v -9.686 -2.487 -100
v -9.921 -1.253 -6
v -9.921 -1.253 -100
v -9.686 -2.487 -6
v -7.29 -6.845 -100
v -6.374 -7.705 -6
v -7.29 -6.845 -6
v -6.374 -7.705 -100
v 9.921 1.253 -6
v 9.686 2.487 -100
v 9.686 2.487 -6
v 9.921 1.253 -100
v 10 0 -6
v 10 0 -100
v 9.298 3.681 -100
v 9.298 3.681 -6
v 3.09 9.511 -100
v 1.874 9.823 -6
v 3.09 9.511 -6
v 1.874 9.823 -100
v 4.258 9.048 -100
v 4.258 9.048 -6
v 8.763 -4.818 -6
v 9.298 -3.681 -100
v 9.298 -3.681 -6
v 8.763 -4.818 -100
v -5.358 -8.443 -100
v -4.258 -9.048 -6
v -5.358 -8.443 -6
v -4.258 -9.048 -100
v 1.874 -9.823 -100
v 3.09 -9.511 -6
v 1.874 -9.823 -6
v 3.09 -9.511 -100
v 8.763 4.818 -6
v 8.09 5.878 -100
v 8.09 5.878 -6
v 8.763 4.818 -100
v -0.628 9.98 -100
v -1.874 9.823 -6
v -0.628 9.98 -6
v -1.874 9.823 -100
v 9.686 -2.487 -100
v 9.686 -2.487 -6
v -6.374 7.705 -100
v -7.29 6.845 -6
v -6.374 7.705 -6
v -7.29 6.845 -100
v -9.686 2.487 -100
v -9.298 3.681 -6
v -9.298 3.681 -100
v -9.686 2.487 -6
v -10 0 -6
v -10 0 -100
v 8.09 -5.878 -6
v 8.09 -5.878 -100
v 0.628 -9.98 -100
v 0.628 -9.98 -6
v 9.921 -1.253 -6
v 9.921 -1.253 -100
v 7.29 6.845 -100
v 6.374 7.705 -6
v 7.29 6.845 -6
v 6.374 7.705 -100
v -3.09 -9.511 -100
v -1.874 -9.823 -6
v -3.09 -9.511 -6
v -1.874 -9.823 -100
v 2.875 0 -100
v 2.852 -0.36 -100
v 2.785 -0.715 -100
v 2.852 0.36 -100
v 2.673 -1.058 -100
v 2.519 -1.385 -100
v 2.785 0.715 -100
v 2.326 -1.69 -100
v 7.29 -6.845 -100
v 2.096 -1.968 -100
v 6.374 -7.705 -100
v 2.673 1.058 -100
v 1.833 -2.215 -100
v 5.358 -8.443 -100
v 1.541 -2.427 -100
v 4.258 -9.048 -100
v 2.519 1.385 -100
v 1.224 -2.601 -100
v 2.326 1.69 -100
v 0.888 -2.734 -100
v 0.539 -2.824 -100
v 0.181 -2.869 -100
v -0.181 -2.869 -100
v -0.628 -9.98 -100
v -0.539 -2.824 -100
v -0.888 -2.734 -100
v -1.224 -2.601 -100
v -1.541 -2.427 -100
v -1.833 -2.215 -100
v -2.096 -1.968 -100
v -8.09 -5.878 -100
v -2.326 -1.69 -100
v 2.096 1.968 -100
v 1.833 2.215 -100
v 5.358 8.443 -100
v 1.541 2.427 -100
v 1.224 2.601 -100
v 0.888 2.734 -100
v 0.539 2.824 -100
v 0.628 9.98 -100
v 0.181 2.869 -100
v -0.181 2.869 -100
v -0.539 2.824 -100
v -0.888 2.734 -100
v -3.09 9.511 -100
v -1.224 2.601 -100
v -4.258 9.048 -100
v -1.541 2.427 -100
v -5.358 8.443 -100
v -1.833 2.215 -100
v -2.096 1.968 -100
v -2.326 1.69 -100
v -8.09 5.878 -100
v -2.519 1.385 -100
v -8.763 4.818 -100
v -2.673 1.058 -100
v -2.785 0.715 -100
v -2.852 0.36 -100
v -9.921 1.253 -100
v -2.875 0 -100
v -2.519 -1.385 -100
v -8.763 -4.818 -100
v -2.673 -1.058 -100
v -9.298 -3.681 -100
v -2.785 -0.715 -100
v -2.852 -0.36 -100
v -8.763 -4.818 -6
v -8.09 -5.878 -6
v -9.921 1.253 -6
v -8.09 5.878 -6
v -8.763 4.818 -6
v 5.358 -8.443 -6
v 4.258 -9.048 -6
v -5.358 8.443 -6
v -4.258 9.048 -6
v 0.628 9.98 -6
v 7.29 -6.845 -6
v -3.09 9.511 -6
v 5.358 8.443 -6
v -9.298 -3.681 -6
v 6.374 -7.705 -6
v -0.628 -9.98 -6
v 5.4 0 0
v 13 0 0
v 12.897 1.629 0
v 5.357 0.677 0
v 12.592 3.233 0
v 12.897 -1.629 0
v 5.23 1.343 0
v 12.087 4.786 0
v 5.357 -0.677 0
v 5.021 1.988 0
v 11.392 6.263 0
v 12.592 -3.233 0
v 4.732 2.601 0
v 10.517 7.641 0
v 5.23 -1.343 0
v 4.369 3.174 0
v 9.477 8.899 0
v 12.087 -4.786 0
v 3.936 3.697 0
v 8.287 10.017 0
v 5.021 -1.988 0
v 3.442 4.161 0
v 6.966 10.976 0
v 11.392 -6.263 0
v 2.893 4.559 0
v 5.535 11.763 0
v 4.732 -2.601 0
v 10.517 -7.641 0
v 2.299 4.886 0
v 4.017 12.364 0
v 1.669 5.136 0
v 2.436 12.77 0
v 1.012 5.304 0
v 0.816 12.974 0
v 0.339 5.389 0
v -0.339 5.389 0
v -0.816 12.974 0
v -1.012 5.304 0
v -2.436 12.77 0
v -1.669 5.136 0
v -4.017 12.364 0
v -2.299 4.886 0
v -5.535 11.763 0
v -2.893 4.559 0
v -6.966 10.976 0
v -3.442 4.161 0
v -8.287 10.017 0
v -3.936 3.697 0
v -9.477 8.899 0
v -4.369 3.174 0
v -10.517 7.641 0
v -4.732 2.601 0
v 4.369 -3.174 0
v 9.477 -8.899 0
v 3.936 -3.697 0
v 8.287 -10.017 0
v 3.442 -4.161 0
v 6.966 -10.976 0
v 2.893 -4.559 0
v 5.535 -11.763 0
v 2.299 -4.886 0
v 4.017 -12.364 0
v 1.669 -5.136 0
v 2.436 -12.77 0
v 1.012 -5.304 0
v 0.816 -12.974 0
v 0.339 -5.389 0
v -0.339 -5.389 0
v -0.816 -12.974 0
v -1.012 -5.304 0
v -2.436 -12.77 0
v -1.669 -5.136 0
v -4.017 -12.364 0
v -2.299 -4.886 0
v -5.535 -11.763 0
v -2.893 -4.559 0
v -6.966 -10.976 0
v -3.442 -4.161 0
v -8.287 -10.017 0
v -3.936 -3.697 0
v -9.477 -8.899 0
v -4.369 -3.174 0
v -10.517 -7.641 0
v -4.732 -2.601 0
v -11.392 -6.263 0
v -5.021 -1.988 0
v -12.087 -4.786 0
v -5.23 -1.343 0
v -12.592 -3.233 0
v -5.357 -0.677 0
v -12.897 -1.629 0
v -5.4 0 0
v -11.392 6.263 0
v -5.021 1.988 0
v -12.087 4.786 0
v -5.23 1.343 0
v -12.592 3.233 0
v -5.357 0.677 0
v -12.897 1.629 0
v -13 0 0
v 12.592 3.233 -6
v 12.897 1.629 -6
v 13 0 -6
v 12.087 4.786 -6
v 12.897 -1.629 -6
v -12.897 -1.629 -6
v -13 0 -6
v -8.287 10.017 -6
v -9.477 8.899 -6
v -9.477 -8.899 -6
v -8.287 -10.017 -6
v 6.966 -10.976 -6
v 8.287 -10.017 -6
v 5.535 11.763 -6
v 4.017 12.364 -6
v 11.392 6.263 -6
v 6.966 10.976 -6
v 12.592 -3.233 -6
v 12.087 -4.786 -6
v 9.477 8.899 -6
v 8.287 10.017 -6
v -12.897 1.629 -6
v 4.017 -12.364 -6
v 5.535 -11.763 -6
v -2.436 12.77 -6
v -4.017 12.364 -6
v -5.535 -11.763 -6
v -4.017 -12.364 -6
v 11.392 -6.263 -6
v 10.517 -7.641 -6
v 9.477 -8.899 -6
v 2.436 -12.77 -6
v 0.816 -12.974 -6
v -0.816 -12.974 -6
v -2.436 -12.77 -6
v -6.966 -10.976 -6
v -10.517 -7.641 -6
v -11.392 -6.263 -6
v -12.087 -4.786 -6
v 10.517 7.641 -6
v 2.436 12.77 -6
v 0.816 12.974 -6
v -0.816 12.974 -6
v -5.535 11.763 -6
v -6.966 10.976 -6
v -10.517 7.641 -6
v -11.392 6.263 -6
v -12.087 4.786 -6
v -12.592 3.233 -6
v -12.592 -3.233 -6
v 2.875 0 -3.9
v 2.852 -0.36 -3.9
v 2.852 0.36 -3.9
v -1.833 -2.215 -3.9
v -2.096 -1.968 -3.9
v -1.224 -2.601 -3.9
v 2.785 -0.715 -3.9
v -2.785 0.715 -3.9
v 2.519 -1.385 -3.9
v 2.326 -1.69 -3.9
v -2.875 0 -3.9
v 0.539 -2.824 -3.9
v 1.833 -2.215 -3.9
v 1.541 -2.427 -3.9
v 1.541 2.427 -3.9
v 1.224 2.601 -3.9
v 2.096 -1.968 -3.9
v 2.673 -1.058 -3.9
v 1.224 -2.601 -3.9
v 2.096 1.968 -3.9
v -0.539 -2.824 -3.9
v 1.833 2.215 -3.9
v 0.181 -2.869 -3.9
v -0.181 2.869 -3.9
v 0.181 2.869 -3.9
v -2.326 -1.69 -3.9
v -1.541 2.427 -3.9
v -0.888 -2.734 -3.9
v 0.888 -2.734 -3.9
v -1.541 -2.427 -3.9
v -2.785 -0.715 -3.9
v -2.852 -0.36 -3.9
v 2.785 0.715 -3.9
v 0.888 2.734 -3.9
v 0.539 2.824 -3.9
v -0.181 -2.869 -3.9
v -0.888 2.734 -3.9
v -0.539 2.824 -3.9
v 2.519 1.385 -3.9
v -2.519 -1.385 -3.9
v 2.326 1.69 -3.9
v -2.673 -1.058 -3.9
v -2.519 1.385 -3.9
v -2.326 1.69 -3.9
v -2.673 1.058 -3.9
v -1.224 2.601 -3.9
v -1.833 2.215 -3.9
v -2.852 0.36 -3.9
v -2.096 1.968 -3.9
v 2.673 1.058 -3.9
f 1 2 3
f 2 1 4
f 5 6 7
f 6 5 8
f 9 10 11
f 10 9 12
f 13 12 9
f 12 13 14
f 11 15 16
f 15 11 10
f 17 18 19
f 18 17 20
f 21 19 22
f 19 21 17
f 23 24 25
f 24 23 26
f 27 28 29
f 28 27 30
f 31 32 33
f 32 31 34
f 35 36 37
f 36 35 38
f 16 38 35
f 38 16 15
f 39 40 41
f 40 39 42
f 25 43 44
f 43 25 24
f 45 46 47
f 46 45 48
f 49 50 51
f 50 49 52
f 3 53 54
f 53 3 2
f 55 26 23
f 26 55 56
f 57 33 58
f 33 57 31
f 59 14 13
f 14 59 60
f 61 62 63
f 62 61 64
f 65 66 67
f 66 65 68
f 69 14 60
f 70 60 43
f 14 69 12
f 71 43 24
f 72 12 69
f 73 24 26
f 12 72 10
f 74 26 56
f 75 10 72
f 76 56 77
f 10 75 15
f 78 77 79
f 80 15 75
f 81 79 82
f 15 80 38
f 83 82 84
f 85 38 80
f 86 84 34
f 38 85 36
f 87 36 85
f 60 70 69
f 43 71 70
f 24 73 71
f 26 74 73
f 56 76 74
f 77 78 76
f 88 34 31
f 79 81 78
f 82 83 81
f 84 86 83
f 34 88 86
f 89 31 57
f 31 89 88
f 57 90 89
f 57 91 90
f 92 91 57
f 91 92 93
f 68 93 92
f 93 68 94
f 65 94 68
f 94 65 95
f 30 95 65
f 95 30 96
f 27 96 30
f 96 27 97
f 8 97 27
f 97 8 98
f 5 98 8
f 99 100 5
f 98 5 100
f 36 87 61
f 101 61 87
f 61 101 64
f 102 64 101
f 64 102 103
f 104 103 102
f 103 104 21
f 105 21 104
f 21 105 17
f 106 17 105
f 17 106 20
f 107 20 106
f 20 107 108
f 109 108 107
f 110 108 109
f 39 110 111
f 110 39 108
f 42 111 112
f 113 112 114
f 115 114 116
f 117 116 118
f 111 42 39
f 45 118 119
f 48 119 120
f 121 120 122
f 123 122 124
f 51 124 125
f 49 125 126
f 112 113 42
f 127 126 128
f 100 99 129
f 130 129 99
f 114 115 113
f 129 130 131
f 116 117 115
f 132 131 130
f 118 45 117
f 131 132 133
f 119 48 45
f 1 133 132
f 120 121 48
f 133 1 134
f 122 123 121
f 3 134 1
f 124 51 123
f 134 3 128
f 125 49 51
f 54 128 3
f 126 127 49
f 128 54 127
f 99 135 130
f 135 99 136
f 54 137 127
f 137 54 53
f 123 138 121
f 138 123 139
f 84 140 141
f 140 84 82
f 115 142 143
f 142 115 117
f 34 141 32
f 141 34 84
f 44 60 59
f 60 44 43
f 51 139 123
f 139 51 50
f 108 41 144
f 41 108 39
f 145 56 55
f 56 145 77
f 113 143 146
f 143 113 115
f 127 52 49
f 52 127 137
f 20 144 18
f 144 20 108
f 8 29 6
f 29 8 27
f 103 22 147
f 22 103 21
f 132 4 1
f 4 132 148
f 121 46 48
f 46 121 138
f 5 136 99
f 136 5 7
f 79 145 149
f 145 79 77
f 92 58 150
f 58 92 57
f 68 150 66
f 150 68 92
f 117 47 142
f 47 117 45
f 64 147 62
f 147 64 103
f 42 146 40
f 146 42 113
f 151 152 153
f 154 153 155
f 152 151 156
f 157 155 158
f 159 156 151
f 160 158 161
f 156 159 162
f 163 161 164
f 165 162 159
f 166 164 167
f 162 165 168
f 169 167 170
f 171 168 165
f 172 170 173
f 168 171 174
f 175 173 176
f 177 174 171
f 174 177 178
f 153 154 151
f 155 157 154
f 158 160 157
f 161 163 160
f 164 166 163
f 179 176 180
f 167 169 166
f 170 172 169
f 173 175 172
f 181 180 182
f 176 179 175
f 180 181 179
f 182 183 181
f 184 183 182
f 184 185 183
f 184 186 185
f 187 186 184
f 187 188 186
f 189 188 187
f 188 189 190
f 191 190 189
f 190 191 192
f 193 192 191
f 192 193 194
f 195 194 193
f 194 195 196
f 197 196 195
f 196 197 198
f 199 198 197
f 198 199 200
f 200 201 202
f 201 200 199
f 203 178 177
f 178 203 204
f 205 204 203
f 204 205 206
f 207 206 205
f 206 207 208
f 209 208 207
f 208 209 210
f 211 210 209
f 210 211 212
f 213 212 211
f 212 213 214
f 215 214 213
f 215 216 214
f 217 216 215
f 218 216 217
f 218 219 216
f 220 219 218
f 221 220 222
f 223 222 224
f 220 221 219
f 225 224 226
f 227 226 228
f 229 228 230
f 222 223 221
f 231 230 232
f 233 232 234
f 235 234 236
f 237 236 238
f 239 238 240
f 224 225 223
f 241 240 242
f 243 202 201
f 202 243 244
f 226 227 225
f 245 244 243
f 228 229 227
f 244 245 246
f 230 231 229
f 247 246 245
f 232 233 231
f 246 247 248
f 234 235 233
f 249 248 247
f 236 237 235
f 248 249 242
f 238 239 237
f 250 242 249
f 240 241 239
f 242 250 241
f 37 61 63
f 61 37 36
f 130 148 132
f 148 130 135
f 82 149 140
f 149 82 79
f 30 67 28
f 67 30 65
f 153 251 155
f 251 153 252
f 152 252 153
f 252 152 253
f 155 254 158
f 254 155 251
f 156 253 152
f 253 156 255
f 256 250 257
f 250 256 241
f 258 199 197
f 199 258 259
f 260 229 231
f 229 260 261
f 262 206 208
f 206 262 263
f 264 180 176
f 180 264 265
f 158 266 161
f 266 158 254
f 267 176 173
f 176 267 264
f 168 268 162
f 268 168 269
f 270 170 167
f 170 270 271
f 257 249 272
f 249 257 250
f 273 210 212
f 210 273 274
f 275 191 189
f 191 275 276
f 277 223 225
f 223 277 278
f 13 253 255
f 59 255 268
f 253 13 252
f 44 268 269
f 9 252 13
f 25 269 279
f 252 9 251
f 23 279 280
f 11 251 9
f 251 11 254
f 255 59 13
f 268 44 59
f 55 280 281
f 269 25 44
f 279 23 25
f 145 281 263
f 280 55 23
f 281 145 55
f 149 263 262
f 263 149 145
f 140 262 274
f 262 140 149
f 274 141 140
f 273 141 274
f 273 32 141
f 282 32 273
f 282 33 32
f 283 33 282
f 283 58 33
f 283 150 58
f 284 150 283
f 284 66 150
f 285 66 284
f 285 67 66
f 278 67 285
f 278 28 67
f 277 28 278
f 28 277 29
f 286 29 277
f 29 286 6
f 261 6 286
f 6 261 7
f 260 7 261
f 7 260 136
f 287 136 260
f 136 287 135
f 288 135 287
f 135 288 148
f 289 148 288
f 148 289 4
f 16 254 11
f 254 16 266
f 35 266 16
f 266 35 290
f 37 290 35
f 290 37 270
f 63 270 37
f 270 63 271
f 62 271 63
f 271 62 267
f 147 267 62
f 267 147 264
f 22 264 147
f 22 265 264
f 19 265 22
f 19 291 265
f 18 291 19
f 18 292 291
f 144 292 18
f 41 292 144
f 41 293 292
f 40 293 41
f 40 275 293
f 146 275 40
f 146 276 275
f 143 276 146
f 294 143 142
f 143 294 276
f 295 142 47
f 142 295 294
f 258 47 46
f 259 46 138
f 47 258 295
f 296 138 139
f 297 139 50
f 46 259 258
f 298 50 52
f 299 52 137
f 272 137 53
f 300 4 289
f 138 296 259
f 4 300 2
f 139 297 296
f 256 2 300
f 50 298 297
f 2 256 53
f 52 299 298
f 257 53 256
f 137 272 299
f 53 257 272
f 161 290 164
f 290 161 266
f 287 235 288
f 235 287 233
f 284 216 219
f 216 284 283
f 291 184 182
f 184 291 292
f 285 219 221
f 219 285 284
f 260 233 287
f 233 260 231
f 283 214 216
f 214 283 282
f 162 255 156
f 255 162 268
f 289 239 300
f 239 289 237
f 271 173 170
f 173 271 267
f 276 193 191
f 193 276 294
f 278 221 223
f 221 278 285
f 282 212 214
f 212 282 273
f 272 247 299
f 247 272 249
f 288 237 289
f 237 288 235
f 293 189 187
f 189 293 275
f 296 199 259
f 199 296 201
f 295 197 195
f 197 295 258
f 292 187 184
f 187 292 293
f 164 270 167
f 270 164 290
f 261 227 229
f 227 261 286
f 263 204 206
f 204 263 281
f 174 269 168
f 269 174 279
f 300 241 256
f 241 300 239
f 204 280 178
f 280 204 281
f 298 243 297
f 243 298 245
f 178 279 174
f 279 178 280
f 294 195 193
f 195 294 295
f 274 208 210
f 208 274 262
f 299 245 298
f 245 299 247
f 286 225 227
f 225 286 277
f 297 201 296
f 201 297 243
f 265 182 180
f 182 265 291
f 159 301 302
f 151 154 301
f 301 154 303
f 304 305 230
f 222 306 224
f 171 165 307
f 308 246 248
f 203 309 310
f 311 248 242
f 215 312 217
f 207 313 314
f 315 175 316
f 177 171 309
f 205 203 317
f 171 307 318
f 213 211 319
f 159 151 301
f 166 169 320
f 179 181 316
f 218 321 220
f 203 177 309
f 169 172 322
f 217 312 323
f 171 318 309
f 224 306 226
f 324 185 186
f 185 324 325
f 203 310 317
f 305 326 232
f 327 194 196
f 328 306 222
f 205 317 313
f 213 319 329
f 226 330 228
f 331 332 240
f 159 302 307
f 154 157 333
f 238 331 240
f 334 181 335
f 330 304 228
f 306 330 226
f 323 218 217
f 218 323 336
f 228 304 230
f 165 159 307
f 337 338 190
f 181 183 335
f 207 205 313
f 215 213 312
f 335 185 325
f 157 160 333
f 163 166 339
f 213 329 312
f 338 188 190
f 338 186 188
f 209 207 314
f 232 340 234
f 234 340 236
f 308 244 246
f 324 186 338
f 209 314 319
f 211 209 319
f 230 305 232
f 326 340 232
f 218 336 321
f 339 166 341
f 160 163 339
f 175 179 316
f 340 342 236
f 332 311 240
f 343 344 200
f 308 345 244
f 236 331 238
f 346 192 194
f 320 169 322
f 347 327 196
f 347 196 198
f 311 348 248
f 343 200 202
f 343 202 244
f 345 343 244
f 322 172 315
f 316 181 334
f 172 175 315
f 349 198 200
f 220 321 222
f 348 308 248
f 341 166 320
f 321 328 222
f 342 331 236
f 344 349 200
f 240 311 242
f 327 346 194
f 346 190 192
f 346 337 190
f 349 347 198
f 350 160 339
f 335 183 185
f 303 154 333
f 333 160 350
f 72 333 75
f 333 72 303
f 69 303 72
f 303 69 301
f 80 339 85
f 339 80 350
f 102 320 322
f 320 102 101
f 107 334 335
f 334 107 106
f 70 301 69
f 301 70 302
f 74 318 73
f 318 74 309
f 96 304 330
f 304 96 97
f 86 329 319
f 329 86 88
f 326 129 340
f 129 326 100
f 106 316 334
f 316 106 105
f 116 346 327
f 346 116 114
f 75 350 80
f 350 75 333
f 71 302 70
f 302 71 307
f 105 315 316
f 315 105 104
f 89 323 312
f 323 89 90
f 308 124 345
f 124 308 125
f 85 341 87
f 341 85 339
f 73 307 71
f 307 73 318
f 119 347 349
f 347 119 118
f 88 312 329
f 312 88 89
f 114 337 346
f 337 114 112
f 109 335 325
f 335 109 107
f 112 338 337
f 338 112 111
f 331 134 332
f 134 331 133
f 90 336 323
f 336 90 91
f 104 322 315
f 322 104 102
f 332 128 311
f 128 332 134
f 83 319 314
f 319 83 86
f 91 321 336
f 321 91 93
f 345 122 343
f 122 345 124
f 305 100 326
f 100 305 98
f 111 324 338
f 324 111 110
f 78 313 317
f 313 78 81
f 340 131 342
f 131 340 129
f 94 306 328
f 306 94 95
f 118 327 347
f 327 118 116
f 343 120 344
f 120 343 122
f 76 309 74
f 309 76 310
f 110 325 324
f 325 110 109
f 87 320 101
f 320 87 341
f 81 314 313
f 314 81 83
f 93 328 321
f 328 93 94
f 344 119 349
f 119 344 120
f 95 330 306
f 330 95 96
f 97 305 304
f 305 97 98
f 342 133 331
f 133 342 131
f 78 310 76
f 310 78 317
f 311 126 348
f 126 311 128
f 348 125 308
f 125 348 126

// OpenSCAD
$fn = 50;


difference() {
	union() {
		translate(v = [0, 0, -100.0000000000]) {
			cylinder(h = 100, r = 10.0000000000);
		}
		translate(v = [0, 0, -6.0000000000]) {
			cylinder(h = 6, r = 13.0000000000);
		}
	}
	union() {
		translate(v = [0, 0, 0]) {
			rotate(a = [0, 0, 0]) {
				difference() {
					union() {
						#translate(v = [0, 0, -100.0000000000]) {
							cylinder(h = 100, r = 2.6000000000);
						}
						#translate(v = [0, 0, -3.9000000000]) {
							cylinder(h = 3.9000000000, r = 10.0000000000, r1 = 2.8750000000, r2 = 5.4000000000);
						}
						#translate(v = [0, 0, -100.0000000000]) {
							cylinder(h = 100, r = 2.8750000000);
						}
						#translate(v = [0, 0, -100.0000000000]) {
							cylinder(h = 100, r = 2.6000000000);
						}
					}
					union();
				}
			}
		}
	}
}
